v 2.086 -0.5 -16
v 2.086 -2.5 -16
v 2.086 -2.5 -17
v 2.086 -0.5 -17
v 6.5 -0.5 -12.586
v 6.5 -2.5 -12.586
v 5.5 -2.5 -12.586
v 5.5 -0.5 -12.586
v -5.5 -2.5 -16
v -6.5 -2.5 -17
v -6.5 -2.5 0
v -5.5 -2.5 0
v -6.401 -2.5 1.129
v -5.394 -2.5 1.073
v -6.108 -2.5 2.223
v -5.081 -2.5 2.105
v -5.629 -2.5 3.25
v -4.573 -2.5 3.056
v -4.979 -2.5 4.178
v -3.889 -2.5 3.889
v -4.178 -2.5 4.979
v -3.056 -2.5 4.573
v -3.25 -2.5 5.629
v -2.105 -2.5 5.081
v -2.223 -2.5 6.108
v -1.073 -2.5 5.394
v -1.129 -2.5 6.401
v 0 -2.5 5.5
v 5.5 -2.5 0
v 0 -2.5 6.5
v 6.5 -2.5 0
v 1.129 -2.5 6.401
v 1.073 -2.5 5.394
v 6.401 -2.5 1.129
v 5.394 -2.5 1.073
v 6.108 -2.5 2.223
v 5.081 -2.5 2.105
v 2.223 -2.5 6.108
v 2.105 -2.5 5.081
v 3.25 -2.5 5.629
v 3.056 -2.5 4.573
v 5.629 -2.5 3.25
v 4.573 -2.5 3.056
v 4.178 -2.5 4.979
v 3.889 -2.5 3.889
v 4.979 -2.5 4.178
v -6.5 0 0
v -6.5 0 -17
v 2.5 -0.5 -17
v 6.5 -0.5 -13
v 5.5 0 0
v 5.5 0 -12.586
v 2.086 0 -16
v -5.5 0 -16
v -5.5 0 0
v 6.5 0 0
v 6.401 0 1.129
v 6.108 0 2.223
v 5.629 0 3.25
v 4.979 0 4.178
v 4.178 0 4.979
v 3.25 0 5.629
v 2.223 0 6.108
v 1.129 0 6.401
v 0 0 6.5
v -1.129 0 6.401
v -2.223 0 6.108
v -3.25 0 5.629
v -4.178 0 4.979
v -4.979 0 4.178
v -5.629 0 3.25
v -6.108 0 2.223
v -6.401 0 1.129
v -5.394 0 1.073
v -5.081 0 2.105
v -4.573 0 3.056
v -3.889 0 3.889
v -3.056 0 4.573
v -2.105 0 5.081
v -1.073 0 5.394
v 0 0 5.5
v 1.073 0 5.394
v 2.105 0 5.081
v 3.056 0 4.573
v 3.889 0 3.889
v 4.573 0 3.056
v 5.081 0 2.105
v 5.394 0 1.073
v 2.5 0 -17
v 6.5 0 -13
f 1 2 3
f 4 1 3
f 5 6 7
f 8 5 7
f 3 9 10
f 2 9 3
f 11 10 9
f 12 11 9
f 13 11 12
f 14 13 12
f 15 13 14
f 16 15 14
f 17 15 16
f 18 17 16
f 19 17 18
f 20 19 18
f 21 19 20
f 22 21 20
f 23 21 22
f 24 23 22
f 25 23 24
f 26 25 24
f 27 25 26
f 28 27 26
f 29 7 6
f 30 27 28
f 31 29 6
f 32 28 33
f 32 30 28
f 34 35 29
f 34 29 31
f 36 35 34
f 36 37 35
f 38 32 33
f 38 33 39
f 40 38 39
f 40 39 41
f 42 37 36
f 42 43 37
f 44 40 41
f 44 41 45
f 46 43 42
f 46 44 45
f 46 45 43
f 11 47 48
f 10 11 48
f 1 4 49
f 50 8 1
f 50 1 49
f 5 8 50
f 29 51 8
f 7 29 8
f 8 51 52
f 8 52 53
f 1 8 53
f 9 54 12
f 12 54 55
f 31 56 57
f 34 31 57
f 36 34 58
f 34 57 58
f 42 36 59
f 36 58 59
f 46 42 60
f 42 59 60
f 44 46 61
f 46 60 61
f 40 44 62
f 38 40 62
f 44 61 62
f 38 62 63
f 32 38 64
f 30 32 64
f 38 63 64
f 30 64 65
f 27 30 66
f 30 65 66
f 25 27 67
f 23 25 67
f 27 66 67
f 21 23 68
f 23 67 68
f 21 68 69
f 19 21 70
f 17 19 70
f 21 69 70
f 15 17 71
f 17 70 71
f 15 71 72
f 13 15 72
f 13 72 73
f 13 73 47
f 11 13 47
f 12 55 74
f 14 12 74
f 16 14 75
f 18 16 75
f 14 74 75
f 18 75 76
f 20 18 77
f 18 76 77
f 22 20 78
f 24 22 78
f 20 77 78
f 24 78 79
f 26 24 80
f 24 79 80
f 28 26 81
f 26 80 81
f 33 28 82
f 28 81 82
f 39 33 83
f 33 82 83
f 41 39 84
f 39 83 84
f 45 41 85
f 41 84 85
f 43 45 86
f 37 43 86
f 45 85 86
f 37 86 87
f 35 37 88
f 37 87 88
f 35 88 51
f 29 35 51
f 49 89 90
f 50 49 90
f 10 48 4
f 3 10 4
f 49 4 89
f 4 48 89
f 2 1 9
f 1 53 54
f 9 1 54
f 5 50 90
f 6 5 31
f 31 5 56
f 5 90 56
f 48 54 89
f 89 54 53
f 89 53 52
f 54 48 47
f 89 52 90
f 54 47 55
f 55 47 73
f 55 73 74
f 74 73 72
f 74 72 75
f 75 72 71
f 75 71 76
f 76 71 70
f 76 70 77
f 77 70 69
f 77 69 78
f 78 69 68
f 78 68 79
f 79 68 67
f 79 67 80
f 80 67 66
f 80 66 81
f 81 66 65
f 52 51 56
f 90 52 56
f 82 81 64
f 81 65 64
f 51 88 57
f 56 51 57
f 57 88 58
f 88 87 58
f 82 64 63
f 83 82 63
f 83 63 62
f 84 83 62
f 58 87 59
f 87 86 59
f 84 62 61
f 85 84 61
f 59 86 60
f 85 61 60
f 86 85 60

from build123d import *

# Parameters (mm, degrees)
F1_DEPTH = 2.5
F3_DEPTH = 2


with BuildPart() as f1:
    # F0 (on Front) → F1 (new body)
    with BuildSketch(Plane.XZ):
        with BuildLine():
            Line((6.5, -13), (6.5, 0))
            ThreePointArc((6.5, 0), (0, 6.5), (-6.5, 0))
            Line((-6.5, 0), (-6.5, -17))
            Line((-6.5, -17), (2.5, -17))
            Line((2.5, -17), (6.5, -13))
        make_face()
        with BuildLine():
            Line((-5.5, -16), (-5.5, 0))
            ThreePointArc((-5.5, 0), (0, 5.5), (5.5, 0))
            Line((5.5, 0), (5.5, -12.585786))
            Line((5.5, -12.585786), (2.085786, -16))
            Line((2.085786, -16), (-5.5, -16))
        make_face(mode=Mode.SUBTRACT)
    extrude(amount=F1_DEPTH)

    # F2 (on face) → F3 (cut)
    with BuildSketch(Plane.XZ.offset(2.5)):
        Polygon((6.5, -12.585786), (5.5, -12.585786), (2.085786, -16), (2.085786, -17), (2.5, -17), (6.5, -13), align=None)
    extrude(amount=-F3_DEPTH, mode=Mode.SUBTRACT)


solid = f1.part
